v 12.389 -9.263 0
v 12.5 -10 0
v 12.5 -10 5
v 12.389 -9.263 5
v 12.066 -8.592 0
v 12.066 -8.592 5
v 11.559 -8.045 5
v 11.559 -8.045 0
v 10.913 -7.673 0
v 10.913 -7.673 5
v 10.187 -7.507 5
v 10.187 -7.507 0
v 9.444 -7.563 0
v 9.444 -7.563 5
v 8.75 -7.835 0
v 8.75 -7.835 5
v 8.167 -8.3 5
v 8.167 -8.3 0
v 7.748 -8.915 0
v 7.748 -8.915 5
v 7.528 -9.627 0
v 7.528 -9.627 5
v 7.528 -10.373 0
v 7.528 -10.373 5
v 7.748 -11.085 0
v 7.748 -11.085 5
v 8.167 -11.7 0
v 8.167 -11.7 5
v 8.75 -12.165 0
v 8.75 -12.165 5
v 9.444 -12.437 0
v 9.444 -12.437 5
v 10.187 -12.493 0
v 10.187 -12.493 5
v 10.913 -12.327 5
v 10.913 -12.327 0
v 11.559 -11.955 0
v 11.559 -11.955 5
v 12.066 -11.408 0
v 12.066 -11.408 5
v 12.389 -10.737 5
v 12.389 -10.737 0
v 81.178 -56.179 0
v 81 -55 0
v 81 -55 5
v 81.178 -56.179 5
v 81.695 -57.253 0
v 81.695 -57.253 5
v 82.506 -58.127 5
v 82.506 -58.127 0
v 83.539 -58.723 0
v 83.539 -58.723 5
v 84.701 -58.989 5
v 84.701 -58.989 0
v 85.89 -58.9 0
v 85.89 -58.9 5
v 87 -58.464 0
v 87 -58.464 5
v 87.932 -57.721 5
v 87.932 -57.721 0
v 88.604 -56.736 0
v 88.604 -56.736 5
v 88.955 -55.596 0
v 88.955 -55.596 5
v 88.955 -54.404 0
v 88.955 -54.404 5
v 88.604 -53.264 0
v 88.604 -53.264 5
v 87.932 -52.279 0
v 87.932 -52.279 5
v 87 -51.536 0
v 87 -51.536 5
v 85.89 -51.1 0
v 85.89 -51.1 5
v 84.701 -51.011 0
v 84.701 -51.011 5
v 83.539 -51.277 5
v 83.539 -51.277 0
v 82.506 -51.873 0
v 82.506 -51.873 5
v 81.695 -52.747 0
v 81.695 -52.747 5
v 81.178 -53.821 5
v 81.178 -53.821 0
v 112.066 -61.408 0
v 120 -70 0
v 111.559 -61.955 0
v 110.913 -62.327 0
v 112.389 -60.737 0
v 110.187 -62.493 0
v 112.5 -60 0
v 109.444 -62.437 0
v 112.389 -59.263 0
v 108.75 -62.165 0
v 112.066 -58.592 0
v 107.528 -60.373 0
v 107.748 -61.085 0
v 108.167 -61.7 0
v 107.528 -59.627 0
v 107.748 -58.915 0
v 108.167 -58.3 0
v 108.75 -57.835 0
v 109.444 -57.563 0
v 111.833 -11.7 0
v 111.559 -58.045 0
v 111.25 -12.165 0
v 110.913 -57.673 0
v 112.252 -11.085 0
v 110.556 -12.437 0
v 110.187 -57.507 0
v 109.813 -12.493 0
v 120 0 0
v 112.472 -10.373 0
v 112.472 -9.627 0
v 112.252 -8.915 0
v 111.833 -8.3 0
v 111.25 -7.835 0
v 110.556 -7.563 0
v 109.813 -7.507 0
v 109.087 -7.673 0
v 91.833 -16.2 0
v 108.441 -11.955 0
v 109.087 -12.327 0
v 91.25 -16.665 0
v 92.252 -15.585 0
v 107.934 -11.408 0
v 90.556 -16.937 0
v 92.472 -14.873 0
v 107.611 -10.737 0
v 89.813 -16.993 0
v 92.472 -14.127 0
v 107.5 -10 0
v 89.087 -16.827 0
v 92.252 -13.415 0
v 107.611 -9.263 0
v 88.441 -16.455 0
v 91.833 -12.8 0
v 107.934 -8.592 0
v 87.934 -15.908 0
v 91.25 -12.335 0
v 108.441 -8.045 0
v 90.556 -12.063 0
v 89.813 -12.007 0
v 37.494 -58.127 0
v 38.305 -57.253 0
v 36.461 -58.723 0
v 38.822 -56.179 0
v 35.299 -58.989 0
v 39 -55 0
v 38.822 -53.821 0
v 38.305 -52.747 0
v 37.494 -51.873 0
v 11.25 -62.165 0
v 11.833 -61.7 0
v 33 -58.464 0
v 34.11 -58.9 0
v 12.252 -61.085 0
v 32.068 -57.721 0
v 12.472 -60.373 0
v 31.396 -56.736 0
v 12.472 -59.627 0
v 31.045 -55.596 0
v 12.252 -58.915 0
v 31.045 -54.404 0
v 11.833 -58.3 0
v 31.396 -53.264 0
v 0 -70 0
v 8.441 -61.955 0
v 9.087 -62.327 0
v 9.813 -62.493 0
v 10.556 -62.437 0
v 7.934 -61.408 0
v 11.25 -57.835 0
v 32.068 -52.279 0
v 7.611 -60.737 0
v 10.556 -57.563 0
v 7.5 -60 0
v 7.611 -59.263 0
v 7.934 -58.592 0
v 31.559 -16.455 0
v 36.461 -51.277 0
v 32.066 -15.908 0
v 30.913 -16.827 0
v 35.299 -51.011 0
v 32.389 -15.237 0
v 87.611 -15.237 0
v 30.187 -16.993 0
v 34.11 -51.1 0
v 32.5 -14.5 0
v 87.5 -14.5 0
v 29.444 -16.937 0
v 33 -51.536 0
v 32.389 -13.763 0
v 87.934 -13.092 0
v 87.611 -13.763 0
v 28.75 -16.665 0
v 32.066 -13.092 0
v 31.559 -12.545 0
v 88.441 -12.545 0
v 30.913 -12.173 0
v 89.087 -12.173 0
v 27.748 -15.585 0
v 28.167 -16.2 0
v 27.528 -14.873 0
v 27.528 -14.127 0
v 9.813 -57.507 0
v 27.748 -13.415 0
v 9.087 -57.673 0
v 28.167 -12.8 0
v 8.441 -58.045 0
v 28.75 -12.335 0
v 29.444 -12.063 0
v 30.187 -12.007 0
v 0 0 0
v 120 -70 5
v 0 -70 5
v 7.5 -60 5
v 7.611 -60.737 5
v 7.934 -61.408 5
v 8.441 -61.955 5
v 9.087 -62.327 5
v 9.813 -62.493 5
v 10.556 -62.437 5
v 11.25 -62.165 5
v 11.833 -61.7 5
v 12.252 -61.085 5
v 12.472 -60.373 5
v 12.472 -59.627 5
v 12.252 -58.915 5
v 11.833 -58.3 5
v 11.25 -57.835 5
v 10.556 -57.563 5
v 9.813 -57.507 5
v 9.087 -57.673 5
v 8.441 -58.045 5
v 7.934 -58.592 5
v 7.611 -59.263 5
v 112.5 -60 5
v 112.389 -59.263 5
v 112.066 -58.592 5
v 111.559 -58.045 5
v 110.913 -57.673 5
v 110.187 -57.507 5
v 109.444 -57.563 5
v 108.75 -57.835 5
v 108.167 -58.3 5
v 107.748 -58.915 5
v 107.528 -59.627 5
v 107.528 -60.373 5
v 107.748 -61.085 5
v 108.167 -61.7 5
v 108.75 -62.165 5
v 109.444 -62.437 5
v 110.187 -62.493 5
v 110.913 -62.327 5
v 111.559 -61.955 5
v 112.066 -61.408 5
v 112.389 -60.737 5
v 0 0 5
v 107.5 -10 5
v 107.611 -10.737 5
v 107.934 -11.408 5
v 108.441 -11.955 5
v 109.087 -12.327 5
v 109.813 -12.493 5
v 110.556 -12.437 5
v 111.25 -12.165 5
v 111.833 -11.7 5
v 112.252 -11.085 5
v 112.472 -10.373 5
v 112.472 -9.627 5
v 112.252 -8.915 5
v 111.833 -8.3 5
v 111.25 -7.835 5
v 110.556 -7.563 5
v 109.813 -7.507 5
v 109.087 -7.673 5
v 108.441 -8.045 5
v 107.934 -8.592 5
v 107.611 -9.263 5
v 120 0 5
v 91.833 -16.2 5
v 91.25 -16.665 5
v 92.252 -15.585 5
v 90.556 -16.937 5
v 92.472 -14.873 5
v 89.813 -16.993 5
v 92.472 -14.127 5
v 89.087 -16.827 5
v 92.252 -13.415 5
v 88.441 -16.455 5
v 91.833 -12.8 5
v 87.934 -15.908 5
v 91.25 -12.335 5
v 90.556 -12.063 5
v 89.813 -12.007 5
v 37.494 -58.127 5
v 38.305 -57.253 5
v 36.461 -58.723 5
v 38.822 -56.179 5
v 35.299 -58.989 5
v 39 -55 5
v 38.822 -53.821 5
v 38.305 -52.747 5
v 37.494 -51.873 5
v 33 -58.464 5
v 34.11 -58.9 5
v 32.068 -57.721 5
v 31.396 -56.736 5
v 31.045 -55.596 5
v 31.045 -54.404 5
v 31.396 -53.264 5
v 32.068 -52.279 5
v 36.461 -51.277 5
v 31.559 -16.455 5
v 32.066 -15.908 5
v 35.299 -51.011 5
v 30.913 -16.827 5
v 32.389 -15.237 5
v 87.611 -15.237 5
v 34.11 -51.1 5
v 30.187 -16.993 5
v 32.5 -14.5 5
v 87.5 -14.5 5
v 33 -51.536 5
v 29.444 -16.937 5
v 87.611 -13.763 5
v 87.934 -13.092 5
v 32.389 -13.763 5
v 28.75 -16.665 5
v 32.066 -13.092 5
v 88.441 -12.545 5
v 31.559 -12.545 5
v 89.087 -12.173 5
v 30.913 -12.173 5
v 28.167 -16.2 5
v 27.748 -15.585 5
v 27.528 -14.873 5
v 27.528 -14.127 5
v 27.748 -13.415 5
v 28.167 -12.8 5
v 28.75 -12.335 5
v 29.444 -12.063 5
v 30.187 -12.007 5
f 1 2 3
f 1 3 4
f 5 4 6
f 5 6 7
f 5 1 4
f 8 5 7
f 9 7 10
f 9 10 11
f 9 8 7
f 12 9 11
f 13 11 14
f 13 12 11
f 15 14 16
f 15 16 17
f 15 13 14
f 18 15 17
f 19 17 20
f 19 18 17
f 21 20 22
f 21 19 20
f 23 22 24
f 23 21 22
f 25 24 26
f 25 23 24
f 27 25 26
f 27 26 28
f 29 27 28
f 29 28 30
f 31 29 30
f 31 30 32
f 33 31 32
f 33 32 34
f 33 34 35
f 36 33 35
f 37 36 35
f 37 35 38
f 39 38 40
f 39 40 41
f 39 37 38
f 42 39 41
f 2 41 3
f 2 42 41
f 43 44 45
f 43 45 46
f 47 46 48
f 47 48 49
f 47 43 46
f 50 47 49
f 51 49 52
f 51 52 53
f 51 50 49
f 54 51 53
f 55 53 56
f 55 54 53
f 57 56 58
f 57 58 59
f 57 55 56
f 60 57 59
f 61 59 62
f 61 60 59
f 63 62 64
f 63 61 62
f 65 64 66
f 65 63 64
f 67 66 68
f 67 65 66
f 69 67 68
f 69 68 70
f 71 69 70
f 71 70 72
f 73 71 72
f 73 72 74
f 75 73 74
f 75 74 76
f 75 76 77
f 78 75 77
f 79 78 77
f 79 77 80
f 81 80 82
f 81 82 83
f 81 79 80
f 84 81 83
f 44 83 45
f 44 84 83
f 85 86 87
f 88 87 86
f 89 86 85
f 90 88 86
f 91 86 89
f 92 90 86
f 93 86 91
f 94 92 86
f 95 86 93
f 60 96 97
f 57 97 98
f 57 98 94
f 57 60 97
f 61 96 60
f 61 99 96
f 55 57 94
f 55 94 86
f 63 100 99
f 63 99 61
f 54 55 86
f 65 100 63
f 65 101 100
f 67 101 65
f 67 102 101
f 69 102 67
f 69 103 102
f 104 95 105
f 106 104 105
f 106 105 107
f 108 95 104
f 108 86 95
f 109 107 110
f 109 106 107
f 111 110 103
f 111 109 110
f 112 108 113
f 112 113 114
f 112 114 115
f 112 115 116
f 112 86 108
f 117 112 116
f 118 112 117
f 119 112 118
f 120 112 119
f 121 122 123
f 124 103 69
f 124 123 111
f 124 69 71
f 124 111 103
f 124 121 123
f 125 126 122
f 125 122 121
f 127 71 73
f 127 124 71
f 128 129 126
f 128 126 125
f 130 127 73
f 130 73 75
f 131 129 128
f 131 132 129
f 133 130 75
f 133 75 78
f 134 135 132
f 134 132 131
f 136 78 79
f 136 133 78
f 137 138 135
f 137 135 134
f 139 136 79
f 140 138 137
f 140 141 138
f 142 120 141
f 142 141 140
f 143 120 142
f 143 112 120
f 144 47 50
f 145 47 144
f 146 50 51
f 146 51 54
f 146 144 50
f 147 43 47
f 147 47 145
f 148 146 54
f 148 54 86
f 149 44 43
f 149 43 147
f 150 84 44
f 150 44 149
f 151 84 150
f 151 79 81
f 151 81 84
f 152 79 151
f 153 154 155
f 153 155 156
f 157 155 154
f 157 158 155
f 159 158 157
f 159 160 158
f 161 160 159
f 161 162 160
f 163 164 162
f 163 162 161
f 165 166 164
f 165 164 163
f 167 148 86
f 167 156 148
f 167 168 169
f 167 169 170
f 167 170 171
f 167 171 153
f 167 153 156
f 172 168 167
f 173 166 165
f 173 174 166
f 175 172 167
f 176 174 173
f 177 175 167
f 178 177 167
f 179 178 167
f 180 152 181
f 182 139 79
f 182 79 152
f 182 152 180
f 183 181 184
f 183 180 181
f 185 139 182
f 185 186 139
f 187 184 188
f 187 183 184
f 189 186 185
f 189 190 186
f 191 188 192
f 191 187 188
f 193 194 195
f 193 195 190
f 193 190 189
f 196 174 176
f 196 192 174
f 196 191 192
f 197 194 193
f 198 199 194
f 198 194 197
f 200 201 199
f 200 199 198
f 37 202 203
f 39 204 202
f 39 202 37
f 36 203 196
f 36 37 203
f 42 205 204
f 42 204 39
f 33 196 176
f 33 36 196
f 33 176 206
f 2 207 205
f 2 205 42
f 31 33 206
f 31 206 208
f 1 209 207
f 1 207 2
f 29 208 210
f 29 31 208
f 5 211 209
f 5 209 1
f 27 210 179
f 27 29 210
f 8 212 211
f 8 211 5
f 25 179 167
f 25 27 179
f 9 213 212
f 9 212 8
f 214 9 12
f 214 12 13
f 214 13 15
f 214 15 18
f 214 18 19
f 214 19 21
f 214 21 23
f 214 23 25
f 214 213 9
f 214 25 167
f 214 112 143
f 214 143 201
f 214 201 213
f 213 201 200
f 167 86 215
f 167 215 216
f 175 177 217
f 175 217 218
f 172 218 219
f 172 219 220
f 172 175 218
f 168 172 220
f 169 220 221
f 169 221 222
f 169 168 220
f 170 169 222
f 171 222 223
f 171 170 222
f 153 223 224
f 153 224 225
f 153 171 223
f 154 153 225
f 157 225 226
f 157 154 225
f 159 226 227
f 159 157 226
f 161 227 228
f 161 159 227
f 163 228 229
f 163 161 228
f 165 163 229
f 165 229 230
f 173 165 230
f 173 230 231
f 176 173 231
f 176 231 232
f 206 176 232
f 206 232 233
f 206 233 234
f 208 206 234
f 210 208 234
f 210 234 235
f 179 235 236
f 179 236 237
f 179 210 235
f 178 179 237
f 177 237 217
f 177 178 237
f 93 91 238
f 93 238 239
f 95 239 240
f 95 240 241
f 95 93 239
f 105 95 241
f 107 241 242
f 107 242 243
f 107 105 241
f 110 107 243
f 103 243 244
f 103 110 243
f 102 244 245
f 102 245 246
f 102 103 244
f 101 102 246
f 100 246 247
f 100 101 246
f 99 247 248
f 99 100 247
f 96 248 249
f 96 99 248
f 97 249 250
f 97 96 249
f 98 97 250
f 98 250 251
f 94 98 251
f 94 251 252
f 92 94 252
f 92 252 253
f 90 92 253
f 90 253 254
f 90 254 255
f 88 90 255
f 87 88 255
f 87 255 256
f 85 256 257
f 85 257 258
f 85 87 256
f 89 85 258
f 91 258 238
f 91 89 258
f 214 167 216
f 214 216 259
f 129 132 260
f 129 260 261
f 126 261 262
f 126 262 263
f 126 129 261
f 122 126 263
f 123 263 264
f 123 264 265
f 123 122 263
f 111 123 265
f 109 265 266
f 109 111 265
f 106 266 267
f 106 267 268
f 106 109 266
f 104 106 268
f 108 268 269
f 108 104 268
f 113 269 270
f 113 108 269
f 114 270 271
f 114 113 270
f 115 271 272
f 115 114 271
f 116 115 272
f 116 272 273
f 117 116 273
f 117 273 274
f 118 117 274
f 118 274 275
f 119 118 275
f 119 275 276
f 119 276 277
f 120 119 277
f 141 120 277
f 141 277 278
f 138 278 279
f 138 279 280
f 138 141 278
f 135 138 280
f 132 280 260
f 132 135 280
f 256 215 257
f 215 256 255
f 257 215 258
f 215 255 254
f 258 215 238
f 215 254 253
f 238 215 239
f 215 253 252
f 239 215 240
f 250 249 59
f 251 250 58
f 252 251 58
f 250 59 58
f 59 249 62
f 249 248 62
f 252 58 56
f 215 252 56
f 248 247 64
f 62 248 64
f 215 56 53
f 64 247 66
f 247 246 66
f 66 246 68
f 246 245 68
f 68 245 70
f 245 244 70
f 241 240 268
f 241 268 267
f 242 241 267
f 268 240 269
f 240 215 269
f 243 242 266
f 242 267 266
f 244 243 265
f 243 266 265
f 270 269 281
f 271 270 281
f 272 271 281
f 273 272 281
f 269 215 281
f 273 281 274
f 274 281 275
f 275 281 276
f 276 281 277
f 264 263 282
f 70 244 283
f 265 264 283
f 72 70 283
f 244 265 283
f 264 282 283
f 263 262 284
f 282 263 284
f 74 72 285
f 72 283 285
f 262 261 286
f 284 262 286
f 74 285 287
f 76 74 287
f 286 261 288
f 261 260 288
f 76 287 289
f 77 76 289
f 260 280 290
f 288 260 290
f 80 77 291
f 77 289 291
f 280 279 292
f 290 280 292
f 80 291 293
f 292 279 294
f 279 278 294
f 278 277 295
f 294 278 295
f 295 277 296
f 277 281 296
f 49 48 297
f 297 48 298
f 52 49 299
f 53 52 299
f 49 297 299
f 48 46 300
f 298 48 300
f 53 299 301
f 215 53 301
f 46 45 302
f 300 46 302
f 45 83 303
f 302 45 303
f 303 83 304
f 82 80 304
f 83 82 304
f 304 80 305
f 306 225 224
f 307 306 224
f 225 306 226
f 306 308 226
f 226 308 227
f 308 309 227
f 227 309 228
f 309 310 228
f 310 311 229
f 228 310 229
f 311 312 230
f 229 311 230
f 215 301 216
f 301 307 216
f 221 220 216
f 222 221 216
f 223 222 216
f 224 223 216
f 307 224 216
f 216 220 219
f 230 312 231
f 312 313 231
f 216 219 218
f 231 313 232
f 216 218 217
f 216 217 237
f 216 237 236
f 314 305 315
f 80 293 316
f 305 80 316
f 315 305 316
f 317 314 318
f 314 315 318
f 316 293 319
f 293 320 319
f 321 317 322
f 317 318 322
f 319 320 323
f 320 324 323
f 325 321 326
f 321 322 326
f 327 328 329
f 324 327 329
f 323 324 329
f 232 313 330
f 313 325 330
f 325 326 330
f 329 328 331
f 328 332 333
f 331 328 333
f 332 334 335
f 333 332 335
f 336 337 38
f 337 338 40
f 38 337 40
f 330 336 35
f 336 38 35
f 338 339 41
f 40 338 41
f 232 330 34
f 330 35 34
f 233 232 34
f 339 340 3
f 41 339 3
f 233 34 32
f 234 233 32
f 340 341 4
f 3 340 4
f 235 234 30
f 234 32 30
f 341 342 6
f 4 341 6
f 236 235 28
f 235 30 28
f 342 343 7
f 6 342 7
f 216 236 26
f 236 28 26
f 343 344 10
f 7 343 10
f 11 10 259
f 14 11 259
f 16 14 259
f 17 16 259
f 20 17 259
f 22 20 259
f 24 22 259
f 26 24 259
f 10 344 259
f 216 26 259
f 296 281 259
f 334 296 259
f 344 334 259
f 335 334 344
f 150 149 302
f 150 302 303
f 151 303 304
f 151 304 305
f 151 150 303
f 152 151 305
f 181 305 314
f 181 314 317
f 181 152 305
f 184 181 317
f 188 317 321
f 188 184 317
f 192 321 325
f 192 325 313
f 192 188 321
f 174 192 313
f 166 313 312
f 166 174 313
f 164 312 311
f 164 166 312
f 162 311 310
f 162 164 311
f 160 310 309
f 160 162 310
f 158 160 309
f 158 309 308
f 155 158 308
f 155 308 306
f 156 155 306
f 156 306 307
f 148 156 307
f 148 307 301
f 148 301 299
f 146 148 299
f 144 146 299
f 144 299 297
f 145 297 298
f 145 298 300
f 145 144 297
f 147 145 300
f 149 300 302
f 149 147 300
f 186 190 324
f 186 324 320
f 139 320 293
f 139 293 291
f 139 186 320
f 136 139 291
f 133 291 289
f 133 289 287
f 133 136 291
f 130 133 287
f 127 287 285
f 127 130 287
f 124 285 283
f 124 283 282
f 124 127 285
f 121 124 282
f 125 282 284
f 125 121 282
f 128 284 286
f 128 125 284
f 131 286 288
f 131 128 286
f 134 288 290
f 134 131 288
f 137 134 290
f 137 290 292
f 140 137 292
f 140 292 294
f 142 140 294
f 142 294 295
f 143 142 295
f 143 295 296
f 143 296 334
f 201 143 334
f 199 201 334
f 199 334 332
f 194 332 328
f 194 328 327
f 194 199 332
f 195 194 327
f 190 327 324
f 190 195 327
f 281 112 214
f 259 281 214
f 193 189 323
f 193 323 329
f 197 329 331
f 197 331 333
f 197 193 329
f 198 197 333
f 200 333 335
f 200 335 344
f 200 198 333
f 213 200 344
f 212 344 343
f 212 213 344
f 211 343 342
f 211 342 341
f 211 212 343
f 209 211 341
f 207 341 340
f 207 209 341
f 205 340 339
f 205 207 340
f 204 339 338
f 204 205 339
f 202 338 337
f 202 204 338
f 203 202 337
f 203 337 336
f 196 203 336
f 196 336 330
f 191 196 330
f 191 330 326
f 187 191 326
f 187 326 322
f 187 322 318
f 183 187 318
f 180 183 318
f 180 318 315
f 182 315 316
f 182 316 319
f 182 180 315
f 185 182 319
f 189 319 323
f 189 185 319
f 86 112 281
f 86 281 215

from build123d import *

# Parameters (mm, degrees)
SKETCH1_R           = 4
SKETCH1_R_2         = 2.5
BOSS_EXTRUDE1_DEPTH = 5


with BuildPart() as part:
    # Sketch1 → Boss-Extrude1 (new body)
    with BuildSketch(Plane.XY):
        Polygon((0, 0), (39, 0), (81, 0), (120, 0), (120, -70), (0, -70), align=None)
        with Locations((35, -55)):
            Circle(SKETCH1_R, mode=Mode.SUBTRACT)
        with Locations(Location((85, -55, 0), (0, 0, 180))):
            Circle(SKETCH1_R, mode=Mode.SUBTRACT)
        with Locations((10, -10)):
            Circle(SKETCH1_R_2, mode=Mode.SUBTRACT)
        with Locations(Location((110, -10, 0), (0, 0, 180))):
            Circle(SKETCH1_R_2, mode=Mode.SUBTRACT)
        with Locations((110, -60)):
            Circle(SKETCH1_R_2, mode=Mode.SUBTRACT)
        with Locations(Location((10, -60, 0), (0, 0, 180))):
            Circle(SKETCH1_R_2, mode=Mode.SUBTRACT)
        with Locations((30, -14.5)):
            Circle(SKETCH1_R_2, mode=Mode.SUBTRACT)
        with Locations(Location((90, -14.5, 0), (0, 0, 180))):
            Circle(SKETCH1_R_2, mode=Mode.SUBTRACT)
    extrude(amount=BOSS_EXTRUDE1_DEPTH)


solid = part.part
